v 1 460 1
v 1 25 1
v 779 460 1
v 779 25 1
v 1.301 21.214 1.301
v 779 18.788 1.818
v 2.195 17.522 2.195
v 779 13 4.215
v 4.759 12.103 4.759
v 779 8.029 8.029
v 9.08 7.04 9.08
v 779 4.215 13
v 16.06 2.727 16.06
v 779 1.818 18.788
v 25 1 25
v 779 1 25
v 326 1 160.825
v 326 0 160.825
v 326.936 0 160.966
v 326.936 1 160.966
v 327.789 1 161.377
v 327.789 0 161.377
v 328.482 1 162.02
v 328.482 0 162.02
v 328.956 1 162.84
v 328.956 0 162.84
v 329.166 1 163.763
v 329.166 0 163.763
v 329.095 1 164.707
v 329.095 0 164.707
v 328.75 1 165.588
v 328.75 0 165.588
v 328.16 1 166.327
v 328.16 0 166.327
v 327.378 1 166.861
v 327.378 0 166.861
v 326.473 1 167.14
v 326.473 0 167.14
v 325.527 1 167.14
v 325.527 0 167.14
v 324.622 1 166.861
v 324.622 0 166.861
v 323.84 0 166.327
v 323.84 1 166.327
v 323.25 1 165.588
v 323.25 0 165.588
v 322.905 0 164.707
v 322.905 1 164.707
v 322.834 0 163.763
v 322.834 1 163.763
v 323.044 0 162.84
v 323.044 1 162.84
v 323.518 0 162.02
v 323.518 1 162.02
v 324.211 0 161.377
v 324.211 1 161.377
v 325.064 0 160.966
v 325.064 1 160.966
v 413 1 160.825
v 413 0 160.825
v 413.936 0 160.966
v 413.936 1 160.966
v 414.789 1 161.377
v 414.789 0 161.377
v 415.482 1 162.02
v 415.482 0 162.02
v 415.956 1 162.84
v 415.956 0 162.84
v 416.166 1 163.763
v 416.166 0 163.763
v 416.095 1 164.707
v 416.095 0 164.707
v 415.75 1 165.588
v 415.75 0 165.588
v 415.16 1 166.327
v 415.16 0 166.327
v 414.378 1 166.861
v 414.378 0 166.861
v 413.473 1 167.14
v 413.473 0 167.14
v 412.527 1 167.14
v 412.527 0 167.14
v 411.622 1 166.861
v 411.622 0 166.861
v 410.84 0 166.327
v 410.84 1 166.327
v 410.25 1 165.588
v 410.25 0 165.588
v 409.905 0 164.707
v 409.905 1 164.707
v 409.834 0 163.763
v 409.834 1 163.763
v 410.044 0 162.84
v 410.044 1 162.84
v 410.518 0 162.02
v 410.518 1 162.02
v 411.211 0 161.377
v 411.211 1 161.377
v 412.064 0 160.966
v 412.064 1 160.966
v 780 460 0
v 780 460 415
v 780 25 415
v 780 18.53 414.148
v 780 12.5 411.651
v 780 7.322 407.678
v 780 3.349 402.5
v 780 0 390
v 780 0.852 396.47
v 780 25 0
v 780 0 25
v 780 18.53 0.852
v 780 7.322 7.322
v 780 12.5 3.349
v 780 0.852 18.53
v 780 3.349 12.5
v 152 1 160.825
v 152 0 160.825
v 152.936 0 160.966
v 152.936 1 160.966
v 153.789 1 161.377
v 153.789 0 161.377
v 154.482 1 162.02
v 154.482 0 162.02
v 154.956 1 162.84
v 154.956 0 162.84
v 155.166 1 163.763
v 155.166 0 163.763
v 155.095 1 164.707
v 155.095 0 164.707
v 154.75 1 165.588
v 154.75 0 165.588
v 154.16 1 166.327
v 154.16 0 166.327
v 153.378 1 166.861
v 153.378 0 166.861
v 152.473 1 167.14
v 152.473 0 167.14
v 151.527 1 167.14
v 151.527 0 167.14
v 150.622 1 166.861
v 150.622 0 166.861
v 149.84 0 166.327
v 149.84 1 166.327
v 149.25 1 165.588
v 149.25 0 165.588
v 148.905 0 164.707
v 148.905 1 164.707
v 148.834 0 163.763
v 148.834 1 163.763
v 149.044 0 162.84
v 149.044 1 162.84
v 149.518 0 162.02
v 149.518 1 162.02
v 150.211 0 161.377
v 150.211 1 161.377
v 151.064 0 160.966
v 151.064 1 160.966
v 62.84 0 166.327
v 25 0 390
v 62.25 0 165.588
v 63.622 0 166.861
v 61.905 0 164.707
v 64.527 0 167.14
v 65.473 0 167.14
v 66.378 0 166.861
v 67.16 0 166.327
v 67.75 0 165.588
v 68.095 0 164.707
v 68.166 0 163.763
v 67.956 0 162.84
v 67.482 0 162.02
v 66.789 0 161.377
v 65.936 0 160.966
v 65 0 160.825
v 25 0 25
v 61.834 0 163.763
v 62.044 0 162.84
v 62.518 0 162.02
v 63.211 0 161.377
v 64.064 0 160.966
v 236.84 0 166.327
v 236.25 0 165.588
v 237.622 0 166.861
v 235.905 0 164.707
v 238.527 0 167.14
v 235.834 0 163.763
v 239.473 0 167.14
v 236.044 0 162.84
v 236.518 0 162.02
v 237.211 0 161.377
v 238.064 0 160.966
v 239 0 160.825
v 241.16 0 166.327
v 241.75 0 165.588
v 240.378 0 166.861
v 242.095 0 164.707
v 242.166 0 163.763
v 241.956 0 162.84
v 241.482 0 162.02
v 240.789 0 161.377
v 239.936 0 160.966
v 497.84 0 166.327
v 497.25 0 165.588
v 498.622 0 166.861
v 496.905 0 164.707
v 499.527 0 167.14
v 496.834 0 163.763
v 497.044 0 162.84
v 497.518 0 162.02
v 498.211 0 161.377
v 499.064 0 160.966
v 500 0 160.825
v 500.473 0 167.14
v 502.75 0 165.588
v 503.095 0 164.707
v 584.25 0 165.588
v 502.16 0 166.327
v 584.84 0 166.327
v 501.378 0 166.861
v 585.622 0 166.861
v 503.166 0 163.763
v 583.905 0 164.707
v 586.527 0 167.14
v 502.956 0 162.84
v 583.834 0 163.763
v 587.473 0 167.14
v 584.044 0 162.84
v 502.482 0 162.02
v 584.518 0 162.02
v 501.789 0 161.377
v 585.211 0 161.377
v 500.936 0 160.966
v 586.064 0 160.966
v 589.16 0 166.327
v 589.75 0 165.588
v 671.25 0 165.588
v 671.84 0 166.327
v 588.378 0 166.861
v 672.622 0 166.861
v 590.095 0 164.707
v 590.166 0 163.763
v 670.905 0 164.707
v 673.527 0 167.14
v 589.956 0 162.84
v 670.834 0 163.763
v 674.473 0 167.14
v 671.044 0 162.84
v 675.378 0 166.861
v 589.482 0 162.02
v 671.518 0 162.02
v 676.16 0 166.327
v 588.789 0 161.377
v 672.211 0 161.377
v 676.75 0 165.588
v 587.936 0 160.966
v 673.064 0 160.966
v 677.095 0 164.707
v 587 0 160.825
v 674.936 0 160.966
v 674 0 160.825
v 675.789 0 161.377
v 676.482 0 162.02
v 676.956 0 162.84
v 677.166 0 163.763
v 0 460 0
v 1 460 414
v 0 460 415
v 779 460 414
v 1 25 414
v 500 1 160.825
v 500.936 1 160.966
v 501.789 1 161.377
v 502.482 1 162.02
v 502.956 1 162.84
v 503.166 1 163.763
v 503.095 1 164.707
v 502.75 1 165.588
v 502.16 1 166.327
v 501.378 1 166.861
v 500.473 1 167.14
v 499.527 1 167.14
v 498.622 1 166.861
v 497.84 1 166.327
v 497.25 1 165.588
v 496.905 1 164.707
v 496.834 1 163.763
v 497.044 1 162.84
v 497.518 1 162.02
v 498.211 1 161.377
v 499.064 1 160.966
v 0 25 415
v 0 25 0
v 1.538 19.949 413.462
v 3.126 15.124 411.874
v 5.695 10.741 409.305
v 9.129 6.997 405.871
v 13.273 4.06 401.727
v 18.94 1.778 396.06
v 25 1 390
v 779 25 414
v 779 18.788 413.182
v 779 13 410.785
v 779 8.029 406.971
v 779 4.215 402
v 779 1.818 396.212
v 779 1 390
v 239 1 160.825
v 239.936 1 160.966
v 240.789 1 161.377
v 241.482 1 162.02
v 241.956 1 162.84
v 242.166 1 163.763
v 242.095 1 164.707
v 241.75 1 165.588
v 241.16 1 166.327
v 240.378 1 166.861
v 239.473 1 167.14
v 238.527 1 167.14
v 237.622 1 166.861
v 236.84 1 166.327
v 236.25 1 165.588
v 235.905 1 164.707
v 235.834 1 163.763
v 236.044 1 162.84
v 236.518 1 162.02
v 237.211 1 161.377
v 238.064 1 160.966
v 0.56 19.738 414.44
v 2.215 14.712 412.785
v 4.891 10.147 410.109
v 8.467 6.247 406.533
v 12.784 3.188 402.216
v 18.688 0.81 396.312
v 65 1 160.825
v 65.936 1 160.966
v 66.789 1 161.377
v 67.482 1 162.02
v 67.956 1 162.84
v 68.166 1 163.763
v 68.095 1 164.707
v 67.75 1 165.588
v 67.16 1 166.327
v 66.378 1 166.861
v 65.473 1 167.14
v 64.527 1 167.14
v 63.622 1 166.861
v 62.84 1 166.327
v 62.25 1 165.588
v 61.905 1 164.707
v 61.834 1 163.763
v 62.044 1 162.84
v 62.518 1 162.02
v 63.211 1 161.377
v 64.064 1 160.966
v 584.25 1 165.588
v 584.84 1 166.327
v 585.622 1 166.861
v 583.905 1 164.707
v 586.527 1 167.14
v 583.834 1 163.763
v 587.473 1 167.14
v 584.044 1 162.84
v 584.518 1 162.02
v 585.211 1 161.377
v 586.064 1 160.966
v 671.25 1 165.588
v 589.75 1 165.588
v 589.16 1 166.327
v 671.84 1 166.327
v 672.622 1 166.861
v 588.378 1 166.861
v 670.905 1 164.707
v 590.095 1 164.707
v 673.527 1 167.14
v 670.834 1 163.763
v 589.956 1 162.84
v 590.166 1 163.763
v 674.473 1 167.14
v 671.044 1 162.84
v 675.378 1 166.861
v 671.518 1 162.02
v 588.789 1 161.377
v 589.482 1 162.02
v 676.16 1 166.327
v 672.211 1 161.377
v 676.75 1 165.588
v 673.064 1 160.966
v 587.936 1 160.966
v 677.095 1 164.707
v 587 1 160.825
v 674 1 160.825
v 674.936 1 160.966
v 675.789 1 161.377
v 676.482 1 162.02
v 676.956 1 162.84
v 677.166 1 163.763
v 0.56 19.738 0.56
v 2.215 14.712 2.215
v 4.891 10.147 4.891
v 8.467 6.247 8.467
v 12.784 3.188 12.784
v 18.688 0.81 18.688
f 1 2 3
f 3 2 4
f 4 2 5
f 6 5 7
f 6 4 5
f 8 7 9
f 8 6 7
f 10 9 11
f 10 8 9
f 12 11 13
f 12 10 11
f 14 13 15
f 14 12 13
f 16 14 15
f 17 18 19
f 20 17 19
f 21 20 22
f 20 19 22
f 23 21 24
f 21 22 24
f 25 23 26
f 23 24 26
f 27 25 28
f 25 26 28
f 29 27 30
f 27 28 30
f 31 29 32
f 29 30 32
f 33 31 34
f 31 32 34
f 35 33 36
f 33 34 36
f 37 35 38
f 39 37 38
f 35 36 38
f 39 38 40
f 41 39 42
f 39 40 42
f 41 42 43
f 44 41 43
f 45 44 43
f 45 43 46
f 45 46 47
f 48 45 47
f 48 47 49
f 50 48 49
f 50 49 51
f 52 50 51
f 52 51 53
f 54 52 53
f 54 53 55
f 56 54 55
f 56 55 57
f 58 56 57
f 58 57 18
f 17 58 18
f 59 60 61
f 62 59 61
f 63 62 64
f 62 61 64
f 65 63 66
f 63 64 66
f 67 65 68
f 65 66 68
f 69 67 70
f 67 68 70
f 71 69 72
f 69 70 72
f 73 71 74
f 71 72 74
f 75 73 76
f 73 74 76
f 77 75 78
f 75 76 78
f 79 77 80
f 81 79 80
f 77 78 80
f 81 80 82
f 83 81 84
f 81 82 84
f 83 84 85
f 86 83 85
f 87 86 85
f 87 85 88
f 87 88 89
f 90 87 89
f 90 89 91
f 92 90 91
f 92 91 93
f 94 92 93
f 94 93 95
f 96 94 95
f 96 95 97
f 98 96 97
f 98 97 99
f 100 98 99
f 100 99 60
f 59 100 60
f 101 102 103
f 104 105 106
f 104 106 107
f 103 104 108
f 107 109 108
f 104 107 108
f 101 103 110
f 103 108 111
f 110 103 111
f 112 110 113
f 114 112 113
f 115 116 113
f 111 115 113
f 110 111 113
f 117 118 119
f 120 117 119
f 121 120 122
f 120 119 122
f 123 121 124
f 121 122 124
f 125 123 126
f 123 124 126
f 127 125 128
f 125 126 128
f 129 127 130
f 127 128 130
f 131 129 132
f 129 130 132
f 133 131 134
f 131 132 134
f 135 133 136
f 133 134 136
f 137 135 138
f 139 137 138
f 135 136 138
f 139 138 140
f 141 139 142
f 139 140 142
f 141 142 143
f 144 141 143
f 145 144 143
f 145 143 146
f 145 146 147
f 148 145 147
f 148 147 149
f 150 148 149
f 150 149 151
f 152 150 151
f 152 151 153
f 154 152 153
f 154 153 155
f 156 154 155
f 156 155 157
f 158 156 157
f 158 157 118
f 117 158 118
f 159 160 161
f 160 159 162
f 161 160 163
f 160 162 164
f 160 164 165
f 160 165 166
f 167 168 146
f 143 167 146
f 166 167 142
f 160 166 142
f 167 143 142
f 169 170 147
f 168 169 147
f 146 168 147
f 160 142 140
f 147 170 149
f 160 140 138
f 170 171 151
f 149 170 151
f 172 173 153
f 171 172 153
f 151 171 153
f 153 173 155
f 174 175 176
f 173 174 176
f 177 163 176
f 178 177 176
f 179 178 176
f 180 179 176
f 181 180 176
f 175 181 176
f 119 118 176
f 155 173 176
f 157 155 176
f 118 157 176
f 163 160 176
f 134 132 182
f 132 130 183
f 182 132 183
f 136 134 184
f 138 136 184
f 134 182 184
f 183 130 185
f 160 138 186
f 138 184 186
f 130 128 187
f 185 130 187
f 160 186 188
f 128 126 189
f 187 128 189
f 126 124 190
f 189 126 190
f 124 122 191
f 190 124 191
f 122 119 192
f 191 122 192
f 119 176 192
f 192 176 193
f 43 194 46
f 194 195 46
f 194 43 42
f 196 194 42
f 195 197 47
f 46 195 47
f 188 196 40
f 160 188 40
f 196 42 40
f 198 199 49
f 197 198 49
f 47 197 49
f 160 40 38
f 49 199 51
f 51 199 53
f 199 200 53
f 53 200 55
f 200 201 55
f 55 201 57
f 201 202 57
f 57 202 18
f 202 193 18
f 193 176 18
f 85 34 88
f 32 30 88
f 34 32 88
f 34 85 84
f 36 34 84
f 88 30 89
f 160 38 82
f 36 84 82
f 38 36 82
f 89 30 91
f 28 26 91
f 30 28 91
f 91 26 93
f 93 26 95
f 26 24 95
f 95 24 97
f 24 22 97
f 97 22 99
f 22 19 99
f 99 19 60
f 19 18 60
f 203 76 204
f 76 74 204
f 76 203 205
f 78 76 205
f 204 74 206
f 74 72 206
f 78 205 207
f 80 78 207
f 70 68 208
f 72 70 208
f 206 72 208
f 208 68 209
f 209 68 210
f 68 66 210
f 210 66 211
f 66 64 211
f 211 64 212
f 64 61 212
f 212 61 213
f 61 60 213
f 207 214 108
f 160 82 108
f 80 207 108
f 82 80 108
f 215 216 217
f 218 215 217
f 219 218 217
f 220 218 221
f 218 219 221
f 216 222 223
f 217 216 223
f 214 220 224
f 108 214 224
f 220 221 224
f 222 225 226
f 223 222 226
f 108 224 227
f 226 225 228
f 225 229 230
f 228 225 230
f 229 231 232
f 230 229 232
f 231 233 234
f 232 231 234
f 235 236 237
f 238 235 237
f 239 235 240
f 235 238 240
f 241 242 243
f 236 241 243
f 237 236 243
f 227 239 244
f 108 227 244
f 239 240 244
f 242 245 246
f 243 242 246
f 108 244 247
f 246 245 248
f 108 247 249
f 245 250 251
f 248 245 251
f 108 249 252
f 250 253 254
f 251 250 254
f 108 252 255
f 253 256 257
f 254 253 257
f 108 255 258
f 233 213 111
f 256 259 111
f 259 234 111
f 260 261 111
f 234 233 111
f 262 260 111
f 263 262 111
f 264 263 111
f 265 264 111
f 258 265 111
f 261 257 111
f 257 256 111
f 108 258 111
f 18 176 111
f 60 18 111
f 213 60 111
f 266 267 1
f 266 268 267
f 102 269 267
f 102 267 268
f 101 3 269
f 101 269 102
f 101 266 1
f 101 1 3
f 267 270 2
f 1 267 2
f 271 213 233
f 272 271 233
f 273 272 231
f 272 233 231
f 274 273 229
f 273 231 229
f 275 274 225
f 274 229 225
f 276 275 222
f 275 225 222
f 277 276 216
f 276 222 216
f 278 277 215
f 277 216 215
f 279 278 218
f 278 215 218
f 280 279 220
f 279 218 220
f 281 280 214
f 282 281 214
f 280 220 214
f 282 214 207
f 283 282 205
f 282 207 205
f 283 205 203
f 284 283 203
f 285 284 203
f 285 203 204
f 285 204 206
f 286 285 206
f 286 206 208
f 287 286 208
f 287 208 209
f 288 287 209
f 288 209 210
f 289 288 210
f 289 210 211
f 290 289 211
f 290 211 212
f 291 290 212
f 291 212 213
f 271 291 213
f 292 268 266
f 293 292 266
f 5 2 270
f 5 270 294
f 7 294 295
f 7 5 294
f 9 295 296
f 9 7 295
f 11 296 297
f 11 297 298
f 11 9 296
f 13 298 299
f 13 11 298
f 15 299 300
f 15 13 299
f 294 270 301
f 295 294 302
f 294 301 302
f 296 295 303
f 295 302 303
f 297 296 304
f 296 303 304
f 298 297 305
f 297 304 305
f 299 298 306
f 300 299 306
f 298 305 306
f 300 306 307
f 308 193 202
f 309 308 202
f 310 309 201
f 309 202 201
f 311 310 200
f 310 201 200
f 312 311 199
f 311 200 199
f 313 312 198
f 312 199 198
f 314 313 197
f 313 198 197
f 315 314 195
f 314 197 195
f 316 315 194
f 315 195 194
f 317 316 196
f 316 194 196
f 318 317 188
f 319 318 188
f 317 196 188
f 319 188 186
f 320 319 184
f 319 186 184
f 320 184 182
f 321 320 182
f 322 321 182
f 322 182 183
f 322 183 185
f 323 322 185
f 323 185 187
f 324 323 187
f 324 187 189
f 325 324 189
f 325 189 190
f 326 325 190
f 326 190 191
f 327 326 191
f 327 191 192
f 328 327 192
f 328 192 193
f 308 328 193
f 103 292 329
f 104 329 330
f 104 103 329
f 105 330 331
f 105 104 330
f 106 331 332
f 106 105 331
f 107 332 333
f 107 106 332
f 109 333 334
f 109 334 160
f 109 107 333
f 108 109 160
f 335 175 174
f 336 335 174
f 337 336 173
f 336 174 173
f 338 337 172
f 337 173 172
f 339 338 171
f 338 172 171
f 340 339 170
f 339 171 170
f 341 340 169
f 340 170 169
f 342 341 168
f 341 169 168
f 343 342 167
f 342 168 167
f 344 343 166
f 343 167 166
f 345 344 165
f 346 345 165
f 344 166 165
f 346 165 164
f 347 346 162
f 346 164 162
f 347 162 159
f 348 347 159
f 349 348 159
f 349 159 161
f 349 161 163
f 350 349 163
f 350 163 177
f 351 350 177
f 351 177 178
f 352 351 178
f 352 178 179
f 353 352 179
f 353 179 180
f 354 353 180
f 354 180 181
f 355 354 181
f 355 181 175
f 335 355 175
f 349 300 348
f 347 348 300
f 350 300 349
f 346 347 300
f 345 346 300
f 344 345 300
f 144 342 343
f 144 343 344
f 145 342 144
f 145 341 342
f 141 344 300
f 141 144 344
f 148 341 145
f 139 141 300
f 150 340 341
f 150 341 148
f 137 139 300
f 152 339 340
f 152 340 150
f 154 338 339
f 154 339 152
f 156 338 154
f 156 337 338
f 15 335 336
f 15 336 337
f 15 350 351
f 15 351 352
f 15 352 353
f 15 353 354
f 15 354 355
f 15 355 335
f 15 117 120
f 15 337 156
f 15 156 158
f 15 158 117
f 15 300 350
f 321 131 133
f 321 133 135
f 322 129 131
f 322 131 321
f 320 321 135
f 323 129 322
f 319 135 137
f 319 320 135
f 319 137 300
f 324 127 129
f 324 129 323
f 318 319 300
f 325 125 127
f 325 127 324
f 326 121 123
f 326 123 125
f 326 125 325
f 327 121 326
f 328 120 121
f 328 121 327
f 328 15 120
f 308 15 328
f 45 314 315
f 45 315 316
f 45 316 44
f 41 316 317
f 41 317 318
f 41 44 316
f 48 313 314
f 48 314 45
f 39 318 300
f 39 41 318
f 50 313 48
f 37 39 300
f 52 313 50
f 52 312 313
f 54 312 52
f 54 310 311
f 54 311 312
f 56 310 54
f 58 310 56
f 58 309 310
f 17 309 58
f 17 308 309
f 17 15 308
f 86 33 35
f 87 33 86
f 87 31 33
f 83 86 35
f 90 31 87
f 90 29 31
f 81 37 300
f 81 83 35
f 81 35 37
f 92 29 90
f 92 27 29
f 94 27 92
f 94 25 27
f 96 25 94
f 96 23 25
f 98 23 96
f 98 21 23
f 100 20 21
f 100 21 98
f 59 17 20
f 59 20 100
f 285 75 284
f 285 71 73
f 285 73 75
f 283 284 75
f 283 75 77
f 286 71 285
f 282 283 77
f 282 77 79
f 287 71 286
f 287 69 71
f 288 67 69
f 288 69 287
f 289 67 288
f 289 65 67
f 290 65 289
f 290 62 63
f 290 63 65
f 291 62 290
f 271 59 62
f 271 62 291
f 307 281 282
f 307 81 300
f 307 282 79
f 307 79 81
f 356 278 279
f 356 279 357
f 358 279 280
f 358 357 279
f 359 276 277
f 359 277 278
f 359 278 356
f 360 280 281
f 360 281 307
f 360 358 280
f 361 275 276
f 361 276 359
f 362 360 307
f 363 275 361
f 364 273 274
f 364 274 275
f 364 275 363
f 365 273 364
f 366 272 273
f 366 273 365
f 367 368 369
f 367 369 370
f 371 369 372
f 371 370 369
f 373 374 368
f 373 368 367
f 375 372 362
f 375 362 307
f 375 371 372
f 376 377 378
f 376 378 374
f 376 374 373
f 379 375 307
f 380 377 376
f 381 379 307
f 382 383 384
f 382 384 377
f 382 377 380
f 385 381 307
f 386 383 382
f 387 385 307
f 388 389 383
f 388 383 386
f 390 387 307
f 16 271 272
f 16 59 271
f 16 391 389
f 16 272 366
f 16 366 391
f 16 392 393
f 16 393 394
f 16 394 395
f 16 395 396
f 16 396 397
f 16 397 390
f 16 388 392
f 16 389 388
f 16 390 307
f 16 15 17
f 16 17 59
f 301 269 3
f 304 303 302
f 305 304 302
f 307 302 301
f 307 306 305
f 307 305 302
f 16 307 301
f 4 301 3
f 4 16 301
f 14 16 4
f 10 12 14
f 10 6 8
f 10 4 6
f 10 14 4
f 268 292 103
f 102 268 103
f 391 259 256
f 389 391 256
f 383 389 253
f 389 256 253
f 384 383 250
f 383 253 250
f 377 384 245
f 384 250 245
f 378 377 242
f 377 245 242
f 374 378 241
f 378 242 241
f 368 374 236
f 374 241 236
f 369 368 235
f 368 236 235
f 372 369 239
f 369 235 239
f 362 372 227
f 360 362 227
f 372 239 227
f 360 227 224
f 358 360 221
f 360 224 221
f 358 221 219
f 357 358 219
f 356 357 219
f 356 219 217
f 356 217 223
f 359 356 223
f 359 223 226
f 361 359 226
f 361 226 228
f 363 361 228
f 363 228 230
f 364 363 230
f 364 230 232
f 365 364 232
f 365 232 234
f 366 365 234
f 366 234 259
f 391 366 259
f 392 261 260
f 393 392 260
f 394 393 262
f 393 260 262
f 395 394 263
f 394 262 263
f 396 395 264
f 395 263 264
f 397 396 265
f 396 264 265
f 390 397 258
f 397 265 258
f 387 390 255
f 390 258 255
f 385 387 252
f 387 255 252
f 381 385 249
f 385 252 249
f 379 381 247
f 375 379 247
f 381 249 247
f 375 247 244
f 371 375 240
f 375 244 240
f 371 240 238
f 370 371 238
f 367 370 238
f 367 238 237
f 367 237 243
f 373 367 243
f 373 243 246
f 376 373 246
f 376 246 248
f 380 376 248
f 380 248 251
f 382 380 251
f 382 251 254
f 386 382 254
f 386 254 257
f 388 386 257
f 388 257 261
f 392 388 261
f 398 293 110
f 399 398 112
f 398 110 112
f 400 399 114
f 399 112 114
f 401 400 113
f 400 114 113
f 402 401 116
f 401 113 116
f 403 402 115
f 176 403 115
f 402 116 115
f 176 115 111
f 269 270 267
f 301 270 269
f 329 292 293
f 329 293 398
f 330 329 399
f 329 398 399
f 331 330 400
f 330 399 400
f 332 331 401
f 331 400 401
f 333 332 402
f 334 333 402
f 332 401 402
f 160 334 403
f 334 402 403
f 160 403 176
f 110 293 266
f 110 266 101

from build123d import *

# Parameters (mm, degrees)
SKETCH1_W           = 780
SKETCH1_H           = 415
BOSS_EXTRUDE1_DEPTH = 460
FILLET1_R           = 25
SHELL1_T            = -1
CUT_EXTRUDE2_REACH  = 998.105
SKETCH2_R           = 3.175


with BuildPart() as part:
    # Sketch1 → Boss-Extrude1 (new body)
    with BuildSketch(Plane(origin=(0, 0, 0), x_dir=(1, 0, 0), z_dir=(0, 1, 0))):
        with Locations((390, -207.5)):
            Rectangle(SKETCH1_W, SKETCH1_H)
    extrude(amount=BOSS_EXTRUDE1_DEPTH)

    # Fillet1
    fillet1_edges = [part.edges().sort_by_distance(p)[0] for p in [
        (390, 0, 0),
        (390, 0, 415),
        (0, 0, 207.5),
    ]]
    fillet(fillet1_edges, radius=FILLET1_R)

    # Shell1
    shell1_openings = [part.faces().sort_by_distance(p)[0] for p in [
        (390, 460, 207.5),
    ]]
    offset(amount=SHELL1_T, openings=shell1_openings)

    # Sketch2 → Cut-Extrude2 (cut, up to next)
    with BuildSketch(Plane.XZ, mode=Mode.PRIVATE) as cut_extrude2_sk1:
        with Locations(Location((65, 164, 0), (0, 0, 270))):
            Circle(SKETCH2_R)
    cut_extrude2_tool1 = extrude(cut_extrude2_sk1.sketch, amount=-CUT_EXTRUDE2_REACH, mode=Mode.PRIVATE) & part.part
    # Sketch2 → Cut-Extrude2 (cut, up to next)
    with BuildSketch(Plane.XZ, mode=Mode.PRIVATE) as cut_extrude2_sk2:
        with Locations(Location((152, 164, 0), (0, 0, 270))):
            Circle(SKETCH2_R)
    cut_extrude2_tool2 = extrude(cut_extrude2_sk2.sketch, amount=-CUT_EXTRUDE2_REACH, mode=Mode.PRIVATE) & part.part
    # Sketch2 → Cut-Extrude2 (cut, up to next)
    with BuildSketch(Plane.XZ, mode=Mode.PRIVATE) as cut_extrude2_sk3:
        with Locations(Location((239, 164, 0), (0, 0, 270))):
            Circle(SKETCH2_R)
    cut_extrude2_tool3 = extrude(cut_extrude2_sk3.sketch, amount=-CUT_EXTRUDE2_REACH, mode=Mode.PRIVATE) & part.part
    # Sketch2 → Cut-Extrude2 (cut, up to next)
    with BuildSketch(Plane.XZ, mode=Mode.PRIVATE) as cut_extrude2_sk4:
        with Locations(Location((326, 164, 0), (0, 0, 270))):
            Circle(SKETCH2_R)
    cut_extrude2_tool4 = extrude(cut_extrude2_sk4.sketch, amount=-CUT_EXTRUDE2_REACH, mode=Mode.PRIVATE) & part.part
    # Sketch2 → Cut-Extrude2 (cut, up to next)
    with BuildSketch(Plane.XZ, mode=Mode.PRIVATE) as cut_extrude2_sk5:
        with Locations(Location((413, 164, 0), (0, 0, 270))):
            Circle(SKETCH2_R)
    cut_extrude2_tool5 = extrude(cut_extrude2_sk5.sketch, amount=-CUT_EXTRUDE2_REACH, mode=Mode.PRIVATE) & part.part
    # Sketch2 → Cut-Extrude2 (cut, up to next)
    with BuildSketch(Plane.XZ, mode=Mode.PRIVATE) as cut_extrude2_sk6:
        with Locations(Location((500, 164, 0), (0, 0, 270))):
            Circle(SKETCH2_R)
    cut_extrude2_tool6 = extrude(cut_extrude2_sk6.sketch, amount=-CUT_EXTRUDE2_REACH, mode=Mode.PRIVATE) & part.part
    # Sketch2 → Cut-Extrude2 (cut, up to next)
    with BuildSketch(Plane.XZ, mode=Mode.PRIVATE) as cut_extrude2_sk7:
        with Locations(Location((587, 164, 0), (0, 0, 270))):
            Circle(SKETCH2_R)
    cut_extrude2_tool7 = extrude(cut_extrude2_sk7.sketch, amount=-CUT_EXTRUDE2_REACH, mode=Mode.PRIVATE) & part.part
    # Sketch2 → Cut-Extrude2 (cut, up to next)
    with BuildSketch(Plane.XZ, mode=Mode.PRIVATE) as cut_extrude2_sk8:
        with Locations(Location((674, 164, 0), (0, 0, 270))):
            Circle(SKETCH2_R)
    cut_extrude2_tool8 = extrude(cut_extrude2_sk8.sketch, amount=-CUT_EXTRUDE2_REACH, mode=Mode.PRIVATE) & part.part
    add(cut_extrude2_tool1.solids().sort_by_distance((65, 0, 164))[0], mode=Mode.SUBTRACT)
    add(cut_extrude2_tool2.solids().sort_by_distance((152, 0, 164))[0], mode=Mode.SUBTRACT)
    add(cut_extrude2_tool3.solids().sort_by_distance((239, 0, 164))[0], mode=Mode.SUBTRACT)
    add(cut_extrude2_tool4.solids().sort_by_distance((326, 0, 164))[0], mode=Mode.SUBTRACT)
    add(cut_extrude2_tool5.solids().sort_by_distance((413, 0, 164))[0], mode=Mode.SUBTRACT)
    add(cut_extrude2_tool6.solids().sort_by_distance((500, 0, 164))[0], mode=Mode.SUBTRACT)
    add(cut_extrude2_tool7.solids().sort_by_distance((587, 0, 164))[0], mode=Mode.SUBTRACT)
    add(cut_extrude2_tool8.solids().sort_by_distance((674, 0, 164))[0], mode=Mode.SUBTRACT)


solid = part.part
